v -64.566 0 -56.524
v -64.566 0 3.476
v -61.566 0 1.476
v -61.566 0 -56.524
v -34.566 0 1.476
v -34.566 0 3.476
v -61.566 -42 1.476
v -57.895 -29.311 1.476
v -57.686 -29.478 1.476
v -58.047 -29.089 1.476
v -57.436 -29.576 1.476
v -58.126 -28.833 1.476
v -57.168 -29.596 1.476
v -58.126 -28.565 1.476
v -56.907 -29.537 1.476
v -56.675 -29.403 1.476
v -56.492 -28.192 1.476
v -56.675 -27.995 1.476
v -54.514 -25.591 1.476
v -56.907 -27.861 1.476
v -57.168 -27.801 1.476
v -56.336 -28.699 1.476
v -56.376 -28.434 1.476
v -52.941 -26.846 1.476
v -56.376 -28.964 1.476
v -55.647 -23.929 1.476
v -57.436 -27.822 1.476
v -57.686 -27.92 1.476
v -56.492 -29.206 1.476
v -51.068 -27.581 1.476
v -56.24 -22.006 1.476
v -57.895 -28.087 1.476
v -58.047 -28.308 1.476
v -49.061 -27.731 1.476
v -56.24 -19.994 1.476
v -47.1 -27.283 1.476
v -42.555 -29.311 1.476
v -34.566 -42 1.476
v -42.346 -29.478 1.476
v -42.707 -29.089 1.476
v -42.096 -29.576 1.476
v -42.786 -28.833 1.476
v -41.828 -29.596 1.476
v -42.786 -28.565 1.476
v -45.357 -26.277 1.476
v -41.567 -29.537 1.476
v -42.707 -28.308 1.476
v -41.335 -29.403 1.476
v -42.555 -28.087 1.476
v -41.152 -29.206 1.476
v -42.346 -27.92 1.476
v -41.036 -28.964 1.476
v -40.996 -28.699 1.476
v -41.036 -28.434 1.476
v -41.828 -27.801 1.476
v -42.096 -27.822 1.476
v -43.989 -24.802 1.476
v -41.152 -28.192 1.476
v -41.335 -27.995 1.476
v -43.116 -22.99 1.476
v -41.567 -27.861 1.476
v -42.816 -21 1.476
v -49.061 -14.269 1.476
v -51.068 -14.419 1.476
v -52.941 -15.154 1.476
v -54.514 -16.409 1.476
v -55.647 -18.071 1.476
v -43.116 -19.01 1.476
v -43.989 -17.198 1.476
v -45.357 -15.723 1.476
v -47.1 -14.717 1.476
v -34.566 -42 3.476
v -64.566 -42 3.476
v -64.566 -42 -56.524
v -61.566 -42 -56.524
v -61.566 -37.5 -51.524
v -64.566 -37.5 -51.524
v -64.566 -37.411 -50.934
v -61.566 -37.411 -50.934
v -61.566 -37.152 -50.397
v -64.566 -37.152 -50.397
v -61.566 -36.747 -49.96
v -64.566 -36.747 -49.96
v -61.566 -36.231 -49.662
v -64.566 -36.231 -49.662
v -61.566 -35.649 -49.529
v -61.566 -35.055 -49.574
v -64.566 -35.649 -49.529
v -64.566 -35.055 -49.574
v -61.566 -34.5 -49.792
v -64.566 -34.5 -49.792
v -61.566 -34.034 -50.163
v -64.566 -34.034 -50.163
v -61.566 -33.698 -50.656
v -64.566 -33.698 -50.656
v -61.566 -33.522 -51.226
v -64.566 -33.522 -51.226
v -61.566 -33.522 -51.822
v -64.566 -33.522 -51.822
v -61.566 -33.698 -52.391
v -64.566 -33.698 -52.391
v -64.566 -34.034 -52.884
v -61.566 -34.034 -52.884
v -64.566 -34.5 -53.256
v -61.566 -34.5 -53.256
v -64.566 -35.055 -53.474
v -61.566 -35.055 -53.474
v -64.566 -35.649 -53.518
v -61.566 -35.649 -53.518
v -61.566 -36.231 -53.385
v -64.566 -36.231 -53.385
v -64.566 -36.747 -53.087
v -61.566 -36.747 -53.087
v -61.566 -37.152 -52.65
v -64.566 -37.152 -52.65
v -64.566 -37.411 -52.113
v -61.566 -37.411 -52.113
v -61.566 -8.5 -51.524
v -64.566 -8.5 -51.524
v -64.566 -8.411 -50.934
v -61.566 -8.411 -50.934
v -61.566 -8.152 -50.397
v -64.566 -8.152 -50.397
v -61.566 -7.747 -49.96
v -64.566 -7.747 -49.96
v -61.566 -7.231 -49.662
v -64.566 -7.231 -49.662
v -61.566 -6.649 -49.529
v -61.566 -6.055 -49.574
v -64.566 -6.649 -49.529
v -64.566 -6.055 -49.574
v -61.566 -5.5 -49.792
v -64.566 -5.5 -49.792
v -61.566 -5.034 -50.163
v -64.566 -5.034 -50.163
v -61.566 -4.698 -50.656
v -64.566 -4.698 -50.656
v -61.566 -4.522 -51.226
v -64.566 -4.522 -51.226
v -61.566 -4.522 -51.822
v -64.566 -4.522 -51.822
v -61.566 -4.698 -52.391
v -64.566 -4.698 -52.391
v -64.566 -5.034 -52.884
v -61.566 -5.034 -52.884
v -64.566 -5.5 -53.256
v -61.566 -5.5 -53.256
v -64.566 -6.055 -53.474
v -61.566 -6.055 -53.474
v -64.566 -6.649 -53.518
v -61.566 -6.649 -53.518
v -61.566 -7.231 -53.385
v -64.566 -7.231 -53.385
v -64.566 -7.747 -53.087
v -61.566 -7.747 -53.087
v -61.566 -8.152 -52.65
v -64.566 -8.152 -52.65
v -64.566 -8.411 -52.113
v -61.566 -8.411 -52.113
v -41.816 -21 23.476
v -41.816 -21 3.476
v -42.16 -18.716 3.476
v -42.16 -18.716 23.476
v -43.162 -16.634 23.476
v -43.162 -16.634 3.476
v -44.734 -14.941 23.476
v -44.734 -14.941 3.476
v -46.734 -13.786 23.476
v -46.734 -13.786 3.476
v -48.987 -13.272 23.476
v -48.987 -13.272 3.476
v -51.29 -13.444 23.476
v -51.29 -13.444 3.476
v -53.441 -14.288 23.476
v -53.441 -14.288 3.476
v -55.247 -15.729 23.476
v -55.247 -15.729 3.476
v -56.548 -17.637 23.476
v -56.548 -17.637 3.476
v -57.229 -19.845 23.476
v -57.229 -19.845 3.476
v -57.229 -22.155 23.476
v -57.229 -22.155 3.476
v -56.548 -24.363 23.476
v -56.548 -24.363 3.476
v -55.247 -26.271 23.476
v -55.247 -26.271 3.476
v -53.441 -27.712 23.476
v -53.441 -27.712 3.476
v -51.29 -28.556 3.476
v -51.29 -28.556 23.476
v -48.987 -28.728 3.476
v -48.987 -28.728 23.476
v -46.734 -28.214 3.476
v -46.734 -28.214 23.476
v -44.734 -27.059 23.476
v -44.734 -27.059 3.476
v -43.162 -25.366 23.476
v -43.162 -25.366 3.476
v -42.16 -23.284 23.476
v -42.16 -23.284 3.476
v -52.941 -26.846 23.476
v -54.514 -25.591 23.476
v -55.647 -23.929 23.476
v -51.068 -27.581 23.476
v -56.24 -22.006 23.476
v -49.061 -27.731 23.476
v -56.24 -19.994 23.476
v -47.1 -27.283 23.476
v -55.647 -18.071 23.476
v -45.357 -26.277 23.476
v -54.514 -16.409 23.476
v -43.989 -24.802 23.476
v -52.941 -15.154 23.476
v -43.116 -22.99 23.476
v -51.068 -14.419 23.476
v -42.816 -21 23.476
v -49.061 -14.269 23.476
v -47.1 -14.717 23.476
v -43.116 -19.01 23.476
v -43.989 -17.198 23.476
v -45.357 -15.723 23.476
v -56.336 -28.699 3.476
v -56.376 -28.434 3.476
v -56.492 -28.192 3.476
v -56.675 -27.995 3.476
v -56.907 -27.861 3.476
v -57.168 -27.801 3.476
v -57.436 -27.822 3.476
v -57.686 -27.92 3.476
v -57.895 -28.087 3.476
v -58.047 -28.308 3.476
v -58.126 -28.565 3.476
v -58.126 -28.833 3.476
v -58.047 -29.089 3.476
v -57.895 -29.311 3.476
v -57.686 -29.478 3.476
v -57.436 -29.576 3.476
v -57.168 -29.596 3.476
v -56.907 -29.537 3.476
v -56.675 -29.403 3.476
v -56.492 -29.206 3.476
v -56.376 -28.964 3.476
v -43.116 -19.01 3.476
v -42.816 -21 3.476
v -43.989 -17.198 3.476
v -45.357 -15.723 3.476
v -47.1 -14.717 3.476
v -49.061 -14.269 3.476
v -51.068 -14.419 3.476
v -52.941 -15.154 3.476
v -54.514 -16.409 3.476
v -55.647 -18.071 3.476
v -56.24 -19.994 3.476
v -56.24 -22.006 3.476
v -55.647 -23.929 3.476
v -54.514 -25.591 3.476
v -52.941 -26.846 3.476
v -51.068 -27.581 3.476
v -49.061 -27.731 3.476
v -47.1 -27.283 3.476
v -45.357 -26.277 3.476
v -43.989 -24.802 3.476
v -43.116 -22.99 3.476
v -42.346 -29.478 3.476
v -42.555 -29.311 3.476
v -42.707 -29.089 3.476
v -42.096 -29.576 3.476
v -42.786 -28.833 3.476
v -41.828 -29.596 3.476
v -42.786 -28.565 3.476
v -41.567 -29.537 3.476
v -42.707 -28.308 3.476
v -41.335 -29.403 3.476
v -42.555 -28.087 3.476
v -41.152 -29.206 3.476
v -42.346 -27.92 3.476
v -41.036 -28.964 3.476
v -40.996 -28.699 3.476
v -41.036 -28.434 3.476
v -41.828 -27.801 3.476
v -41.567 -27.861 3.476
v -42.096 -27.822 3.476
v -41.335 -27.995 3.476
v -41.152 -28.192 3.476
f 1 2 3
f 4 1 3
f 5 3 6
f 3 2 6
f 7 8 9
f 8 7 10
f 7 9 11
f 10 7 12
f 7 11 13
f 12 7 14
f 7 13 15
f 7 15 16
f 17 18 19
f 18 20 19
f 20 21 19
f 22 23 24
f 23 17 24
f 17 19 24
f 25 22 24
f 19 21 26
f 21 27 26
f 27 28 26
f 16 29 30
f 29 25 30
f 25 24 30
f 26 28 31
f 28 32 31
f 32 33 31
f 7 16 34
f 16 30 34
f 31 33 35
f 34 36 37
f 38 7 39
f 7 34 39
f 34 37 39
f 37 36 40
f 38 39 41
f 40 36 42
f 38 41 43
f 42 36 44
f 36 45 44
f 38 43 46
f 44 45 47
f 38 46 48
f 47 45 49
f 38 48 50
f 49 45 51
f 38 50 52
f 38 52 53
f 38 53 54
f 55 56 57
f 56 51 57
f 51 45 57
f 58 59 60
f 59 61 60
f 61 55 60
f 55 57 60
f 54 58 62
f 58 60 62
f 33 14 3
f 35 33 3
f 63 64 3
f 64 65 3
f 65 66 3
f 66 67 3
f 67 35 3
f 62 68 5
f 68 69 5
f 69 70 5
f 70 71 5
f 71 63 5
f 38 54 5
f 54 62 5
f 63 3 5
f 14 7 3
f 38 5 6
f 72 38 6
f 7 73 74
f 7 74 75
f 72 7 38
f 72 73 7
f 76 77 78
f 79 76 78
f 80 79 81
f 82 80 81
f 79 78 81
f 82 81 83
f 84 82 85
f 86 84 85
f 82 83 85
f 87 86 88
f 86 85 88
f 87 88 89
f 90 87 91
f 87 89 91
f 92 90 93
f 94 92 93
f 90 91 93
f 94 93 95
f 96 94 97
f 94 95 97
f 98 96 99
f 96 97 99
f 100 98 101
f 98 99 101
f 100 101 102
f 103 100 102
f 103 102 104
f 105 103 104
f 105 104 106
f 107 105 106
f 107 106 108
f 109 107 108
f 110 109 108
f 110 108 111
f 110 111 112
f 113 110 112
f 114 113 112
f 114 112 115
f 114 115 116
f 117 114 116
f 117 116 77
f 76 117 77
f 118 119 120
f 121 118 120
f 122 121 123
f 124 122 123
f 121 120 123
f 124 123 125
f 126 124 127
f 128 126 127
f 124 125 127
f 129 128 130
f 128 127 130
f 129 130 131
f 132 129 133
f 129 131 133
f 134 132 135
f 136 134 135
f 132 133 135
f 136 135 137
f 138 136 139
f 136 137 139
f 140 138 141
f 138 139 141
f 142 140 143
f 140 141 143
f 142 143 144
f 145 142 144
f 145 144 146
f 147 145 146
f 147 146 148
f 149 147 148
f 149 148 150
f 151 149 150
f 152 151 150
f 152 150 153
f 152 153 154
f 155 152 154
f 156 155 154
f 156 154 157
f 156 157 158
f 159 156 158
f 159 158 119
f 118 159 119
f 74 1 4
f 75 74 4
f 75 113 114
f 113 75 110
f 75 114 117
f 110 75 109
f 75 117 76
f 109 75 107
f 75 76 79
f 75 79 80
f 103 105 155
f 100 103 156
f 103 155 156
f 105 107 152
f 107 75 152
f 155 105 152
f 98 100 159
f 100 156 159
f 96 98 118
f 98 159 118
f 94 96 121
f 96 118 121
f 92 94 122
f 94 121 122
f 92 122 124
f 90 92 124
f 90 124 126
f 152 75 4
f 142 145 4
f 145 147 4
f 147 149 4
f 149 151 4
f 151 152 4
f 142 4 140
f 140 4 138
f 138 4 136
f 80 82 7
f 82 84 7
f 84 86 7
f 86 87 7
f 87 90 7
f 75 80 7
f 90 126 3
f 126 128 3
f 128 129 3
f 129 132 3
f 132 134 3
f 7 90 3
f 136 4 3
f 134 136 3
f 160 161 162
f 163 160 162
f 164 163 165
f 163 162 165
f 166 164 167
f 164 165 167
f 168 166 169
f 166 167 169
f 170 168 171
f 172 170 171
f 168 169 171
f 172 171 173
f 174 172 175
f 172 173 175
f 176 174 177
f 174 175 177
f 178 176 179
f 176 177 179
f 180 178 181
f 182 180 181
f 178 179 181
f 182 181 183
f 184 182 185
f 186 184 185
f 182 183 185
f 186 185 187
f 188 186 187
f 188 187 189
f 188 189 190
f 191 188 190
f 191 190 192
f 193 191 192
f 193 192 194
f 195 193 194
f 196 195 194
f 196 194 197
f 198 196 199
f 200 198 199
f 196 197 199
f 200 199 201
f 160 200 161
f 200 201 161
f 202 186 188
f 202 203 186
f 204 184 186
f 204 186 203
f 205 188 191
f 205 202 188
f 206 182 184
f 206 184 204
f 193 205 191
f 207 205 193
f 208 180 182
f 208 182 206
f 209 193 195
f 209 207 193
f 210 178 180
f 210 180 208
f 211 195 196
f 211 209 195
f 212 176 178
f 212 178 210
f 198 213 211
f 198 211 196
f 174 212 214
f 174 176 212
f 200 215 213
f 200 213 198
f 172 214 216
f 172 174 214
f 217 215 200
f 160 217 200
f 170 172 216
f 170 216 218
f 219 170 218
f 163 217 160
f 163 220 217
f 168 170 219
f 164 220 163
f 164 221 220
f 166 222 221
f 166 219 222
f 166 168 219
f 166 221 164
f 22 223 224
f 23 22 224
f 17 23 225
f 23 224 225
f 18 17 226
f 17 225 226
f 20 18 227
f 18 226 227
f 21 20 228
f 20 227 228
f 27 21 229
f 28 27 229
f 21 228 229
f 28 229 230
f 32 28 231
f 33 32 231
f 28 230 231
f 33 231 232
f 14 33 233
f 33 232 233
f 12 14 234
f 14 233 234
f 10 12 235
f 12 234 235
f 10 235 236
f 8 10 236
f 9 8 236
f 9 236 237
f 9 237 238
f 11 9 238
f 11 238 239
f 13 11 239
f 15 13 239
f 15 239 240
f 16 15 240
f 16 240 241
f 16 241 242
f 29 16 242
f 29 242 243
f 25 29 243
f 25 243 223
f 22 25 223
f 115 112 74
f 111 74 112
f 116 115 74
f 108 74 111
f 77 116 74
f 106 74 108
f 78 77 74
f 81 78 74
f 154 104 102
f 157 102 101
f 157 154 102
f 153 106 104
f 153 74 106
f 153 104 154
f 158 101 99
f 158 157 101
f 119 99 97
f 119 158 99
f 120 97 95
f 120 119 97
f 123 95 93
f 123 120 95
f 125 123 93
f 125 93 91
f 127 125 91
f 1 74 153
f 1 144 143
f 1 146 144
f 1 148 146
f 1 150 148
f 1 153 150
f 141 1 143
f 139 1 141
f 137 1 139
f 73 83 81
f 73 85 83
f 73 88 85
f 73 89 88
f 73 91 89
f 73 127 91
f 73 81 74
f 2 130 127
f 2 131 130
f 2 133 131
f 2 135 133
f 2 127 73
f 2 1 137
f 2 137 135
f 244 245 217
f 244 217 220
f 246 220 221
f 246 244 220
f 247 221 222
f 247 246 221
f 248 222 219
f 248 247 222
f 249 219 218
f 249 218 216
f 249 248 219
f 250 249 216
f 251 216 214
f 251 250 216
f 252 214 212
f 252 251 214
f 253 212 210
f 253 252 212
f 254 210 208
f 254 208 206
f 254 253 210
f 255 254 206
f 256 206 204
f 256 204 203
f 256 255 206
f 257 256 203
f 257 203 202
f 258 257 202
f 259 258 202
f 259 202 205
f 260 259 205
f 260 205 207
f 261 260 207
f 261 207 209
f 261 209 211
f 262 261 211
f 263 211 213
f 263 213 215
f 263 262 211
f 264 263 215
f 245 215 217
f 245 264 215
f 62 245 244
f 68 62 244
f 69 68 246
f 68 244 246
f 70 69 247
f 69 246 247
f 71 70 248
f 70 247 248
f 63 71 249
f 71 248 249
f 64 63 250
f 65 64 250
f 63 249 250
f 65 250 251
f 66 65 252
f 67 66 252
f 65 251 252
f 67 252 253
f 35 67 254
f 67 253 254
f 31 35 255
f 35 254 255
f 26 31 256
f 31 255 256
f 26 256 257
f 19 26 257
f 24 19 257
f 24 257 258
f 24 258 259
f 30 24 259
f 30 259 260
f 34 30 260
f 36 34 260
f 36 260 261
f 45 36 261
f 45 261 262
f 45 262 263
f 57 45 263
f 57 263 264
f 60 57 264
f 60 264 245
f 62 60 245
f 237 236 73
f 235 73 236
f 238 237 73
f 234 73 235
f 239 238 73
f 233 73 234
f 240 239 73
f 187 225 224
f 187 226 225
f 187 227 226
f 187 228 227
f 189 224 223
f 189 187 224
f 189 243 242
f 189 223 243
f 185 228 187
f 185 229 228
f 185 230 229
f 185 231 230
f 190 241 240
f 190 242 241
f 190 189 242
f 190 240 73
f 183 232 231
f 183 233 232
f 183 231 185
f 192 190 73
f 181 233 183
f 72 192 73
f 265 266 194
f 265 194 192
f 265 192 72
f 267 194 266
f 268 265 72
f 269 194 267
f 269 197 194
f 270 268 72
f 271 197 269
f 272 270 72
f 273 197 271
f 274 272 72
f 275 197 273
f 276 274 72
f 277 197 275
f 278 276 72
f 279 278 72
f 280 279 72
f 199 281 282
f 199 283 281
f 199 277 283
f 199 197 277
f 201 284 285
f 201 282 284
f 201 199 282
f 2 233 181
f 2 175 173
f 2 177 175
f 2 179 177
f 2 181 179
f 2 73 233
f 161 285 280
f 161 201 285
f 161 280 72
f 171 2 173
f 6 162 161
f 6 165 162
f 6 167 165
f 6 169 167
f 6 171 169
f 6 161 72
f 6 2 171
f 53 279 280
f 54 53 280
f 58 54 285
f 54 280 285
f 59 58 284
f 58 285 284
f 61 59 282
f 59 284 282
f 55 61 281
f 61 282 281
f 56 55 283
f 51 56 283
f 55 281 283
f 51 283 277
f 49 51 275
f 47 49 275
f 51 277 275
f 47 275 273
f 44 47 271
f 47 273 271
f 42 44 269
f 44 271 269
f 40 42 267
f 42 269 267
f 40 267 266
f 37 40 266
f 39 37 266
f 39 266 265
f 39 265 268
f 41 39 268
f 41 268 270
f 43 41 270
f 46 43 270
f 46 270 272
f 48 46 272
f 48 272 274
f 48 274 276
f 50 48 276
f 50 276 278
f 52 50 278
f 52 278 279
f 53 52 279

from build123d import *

# Parameters (mm, degrees)
F0_W      = 3
F0_H      = 60
F1_DEPTH  = 42
F2_W      = 30
F2_H      = 2
F3_DEPTH  = 42
F4_R      = 7.5
F4_W      = 30
F4_H      = 42
F5_DEPTH  = 2
F6_R      = 7.75
F6_R_2    = 6.75
F7_DEPTH  = 20
F9_R      = 2
F10_DEPTH = 25
F11_DEPTH = 25
F8_R      = 0.9
F12_DEPTH = 25


with BuildPart() as f1:
    # F0 (on Front) → F1 (new body)
    with BuildSketch(Plane.XZ):
        with Locations((-63.065696, -26.523725)):
            Rectangle(F0_W, F0_H)
    extrude(amount=F1_DEPTH)

    # F2 (on Front) → F3 (join)
    with BuildSketch(Plane.XZ):
        with Locations((-49.565696, 2.476275)):
            Rectangle(F2_W, F2_H)
    extrude(amount=F3_DEPTH)

    # F4 (on face) → F5 (join)
    with BuildSketch(Plane.XY.offset(3.476275)):
        with Locations((-43.565696, -21)):
            Circle(F4_R)
        with Locations((-49.565696, -21)):
            Rectangle(F4_W, F4_H)
        with Locations((-43.565696, -21)):
            Circle(F4_R, mode=Mode.SUBTRACT)
    extrude(amount=-F5_DEPTH)

    # F6 (on face) → F7 (join)
    with BuildSketch(Plane.XY.offset(3.476275)):
        with Locations((-49.565696, -21)):
            Circle(F6_R)
        with Locations((-49.565696, -21)):
            Circle(F6_R_2, mode=Mode.SUBTRACT)
    extrude(amount=F7_DEPTH)

    # F9 (on face) → F10 (cut)
    with BuildSketch(Plane(origin=(-64.565696, 0, 0), x_dir=(0, -1, 0), z_dir=(-1, 0, 0))):
        with Locations((35.5, -51.523725)):
            Circle(F9_R)
        with Locations((6.5, -51.523725)):
            Circle(F9_R)
    extrude(amount=-F10_DEPTH, mode=Mode.SUBTRACT)

    # F6 (on face) → F11 (cut)
    with BuildSketch(Plane.XY.offset(3.476275)):
        with Locations((-49.565696, -21)):
            Circle(F6_R_2)
    extrude(amount=-F11_DEPTH, mode=Mode.SUBTRACT)

    # F8 (on face) → F12 (cut)
    with BuildSketch(Plane.XY.offset(3.476275)):
        with Locations((-57.235696, -28.698958)):
            Circle(F8_R)
        with Locations((-41.895696, -28.698951)):
            Circle(F8_R)
    extrude(amount=-F12_DEPTH, mode=Mode.SUBTRACT)


solid = f1.part
